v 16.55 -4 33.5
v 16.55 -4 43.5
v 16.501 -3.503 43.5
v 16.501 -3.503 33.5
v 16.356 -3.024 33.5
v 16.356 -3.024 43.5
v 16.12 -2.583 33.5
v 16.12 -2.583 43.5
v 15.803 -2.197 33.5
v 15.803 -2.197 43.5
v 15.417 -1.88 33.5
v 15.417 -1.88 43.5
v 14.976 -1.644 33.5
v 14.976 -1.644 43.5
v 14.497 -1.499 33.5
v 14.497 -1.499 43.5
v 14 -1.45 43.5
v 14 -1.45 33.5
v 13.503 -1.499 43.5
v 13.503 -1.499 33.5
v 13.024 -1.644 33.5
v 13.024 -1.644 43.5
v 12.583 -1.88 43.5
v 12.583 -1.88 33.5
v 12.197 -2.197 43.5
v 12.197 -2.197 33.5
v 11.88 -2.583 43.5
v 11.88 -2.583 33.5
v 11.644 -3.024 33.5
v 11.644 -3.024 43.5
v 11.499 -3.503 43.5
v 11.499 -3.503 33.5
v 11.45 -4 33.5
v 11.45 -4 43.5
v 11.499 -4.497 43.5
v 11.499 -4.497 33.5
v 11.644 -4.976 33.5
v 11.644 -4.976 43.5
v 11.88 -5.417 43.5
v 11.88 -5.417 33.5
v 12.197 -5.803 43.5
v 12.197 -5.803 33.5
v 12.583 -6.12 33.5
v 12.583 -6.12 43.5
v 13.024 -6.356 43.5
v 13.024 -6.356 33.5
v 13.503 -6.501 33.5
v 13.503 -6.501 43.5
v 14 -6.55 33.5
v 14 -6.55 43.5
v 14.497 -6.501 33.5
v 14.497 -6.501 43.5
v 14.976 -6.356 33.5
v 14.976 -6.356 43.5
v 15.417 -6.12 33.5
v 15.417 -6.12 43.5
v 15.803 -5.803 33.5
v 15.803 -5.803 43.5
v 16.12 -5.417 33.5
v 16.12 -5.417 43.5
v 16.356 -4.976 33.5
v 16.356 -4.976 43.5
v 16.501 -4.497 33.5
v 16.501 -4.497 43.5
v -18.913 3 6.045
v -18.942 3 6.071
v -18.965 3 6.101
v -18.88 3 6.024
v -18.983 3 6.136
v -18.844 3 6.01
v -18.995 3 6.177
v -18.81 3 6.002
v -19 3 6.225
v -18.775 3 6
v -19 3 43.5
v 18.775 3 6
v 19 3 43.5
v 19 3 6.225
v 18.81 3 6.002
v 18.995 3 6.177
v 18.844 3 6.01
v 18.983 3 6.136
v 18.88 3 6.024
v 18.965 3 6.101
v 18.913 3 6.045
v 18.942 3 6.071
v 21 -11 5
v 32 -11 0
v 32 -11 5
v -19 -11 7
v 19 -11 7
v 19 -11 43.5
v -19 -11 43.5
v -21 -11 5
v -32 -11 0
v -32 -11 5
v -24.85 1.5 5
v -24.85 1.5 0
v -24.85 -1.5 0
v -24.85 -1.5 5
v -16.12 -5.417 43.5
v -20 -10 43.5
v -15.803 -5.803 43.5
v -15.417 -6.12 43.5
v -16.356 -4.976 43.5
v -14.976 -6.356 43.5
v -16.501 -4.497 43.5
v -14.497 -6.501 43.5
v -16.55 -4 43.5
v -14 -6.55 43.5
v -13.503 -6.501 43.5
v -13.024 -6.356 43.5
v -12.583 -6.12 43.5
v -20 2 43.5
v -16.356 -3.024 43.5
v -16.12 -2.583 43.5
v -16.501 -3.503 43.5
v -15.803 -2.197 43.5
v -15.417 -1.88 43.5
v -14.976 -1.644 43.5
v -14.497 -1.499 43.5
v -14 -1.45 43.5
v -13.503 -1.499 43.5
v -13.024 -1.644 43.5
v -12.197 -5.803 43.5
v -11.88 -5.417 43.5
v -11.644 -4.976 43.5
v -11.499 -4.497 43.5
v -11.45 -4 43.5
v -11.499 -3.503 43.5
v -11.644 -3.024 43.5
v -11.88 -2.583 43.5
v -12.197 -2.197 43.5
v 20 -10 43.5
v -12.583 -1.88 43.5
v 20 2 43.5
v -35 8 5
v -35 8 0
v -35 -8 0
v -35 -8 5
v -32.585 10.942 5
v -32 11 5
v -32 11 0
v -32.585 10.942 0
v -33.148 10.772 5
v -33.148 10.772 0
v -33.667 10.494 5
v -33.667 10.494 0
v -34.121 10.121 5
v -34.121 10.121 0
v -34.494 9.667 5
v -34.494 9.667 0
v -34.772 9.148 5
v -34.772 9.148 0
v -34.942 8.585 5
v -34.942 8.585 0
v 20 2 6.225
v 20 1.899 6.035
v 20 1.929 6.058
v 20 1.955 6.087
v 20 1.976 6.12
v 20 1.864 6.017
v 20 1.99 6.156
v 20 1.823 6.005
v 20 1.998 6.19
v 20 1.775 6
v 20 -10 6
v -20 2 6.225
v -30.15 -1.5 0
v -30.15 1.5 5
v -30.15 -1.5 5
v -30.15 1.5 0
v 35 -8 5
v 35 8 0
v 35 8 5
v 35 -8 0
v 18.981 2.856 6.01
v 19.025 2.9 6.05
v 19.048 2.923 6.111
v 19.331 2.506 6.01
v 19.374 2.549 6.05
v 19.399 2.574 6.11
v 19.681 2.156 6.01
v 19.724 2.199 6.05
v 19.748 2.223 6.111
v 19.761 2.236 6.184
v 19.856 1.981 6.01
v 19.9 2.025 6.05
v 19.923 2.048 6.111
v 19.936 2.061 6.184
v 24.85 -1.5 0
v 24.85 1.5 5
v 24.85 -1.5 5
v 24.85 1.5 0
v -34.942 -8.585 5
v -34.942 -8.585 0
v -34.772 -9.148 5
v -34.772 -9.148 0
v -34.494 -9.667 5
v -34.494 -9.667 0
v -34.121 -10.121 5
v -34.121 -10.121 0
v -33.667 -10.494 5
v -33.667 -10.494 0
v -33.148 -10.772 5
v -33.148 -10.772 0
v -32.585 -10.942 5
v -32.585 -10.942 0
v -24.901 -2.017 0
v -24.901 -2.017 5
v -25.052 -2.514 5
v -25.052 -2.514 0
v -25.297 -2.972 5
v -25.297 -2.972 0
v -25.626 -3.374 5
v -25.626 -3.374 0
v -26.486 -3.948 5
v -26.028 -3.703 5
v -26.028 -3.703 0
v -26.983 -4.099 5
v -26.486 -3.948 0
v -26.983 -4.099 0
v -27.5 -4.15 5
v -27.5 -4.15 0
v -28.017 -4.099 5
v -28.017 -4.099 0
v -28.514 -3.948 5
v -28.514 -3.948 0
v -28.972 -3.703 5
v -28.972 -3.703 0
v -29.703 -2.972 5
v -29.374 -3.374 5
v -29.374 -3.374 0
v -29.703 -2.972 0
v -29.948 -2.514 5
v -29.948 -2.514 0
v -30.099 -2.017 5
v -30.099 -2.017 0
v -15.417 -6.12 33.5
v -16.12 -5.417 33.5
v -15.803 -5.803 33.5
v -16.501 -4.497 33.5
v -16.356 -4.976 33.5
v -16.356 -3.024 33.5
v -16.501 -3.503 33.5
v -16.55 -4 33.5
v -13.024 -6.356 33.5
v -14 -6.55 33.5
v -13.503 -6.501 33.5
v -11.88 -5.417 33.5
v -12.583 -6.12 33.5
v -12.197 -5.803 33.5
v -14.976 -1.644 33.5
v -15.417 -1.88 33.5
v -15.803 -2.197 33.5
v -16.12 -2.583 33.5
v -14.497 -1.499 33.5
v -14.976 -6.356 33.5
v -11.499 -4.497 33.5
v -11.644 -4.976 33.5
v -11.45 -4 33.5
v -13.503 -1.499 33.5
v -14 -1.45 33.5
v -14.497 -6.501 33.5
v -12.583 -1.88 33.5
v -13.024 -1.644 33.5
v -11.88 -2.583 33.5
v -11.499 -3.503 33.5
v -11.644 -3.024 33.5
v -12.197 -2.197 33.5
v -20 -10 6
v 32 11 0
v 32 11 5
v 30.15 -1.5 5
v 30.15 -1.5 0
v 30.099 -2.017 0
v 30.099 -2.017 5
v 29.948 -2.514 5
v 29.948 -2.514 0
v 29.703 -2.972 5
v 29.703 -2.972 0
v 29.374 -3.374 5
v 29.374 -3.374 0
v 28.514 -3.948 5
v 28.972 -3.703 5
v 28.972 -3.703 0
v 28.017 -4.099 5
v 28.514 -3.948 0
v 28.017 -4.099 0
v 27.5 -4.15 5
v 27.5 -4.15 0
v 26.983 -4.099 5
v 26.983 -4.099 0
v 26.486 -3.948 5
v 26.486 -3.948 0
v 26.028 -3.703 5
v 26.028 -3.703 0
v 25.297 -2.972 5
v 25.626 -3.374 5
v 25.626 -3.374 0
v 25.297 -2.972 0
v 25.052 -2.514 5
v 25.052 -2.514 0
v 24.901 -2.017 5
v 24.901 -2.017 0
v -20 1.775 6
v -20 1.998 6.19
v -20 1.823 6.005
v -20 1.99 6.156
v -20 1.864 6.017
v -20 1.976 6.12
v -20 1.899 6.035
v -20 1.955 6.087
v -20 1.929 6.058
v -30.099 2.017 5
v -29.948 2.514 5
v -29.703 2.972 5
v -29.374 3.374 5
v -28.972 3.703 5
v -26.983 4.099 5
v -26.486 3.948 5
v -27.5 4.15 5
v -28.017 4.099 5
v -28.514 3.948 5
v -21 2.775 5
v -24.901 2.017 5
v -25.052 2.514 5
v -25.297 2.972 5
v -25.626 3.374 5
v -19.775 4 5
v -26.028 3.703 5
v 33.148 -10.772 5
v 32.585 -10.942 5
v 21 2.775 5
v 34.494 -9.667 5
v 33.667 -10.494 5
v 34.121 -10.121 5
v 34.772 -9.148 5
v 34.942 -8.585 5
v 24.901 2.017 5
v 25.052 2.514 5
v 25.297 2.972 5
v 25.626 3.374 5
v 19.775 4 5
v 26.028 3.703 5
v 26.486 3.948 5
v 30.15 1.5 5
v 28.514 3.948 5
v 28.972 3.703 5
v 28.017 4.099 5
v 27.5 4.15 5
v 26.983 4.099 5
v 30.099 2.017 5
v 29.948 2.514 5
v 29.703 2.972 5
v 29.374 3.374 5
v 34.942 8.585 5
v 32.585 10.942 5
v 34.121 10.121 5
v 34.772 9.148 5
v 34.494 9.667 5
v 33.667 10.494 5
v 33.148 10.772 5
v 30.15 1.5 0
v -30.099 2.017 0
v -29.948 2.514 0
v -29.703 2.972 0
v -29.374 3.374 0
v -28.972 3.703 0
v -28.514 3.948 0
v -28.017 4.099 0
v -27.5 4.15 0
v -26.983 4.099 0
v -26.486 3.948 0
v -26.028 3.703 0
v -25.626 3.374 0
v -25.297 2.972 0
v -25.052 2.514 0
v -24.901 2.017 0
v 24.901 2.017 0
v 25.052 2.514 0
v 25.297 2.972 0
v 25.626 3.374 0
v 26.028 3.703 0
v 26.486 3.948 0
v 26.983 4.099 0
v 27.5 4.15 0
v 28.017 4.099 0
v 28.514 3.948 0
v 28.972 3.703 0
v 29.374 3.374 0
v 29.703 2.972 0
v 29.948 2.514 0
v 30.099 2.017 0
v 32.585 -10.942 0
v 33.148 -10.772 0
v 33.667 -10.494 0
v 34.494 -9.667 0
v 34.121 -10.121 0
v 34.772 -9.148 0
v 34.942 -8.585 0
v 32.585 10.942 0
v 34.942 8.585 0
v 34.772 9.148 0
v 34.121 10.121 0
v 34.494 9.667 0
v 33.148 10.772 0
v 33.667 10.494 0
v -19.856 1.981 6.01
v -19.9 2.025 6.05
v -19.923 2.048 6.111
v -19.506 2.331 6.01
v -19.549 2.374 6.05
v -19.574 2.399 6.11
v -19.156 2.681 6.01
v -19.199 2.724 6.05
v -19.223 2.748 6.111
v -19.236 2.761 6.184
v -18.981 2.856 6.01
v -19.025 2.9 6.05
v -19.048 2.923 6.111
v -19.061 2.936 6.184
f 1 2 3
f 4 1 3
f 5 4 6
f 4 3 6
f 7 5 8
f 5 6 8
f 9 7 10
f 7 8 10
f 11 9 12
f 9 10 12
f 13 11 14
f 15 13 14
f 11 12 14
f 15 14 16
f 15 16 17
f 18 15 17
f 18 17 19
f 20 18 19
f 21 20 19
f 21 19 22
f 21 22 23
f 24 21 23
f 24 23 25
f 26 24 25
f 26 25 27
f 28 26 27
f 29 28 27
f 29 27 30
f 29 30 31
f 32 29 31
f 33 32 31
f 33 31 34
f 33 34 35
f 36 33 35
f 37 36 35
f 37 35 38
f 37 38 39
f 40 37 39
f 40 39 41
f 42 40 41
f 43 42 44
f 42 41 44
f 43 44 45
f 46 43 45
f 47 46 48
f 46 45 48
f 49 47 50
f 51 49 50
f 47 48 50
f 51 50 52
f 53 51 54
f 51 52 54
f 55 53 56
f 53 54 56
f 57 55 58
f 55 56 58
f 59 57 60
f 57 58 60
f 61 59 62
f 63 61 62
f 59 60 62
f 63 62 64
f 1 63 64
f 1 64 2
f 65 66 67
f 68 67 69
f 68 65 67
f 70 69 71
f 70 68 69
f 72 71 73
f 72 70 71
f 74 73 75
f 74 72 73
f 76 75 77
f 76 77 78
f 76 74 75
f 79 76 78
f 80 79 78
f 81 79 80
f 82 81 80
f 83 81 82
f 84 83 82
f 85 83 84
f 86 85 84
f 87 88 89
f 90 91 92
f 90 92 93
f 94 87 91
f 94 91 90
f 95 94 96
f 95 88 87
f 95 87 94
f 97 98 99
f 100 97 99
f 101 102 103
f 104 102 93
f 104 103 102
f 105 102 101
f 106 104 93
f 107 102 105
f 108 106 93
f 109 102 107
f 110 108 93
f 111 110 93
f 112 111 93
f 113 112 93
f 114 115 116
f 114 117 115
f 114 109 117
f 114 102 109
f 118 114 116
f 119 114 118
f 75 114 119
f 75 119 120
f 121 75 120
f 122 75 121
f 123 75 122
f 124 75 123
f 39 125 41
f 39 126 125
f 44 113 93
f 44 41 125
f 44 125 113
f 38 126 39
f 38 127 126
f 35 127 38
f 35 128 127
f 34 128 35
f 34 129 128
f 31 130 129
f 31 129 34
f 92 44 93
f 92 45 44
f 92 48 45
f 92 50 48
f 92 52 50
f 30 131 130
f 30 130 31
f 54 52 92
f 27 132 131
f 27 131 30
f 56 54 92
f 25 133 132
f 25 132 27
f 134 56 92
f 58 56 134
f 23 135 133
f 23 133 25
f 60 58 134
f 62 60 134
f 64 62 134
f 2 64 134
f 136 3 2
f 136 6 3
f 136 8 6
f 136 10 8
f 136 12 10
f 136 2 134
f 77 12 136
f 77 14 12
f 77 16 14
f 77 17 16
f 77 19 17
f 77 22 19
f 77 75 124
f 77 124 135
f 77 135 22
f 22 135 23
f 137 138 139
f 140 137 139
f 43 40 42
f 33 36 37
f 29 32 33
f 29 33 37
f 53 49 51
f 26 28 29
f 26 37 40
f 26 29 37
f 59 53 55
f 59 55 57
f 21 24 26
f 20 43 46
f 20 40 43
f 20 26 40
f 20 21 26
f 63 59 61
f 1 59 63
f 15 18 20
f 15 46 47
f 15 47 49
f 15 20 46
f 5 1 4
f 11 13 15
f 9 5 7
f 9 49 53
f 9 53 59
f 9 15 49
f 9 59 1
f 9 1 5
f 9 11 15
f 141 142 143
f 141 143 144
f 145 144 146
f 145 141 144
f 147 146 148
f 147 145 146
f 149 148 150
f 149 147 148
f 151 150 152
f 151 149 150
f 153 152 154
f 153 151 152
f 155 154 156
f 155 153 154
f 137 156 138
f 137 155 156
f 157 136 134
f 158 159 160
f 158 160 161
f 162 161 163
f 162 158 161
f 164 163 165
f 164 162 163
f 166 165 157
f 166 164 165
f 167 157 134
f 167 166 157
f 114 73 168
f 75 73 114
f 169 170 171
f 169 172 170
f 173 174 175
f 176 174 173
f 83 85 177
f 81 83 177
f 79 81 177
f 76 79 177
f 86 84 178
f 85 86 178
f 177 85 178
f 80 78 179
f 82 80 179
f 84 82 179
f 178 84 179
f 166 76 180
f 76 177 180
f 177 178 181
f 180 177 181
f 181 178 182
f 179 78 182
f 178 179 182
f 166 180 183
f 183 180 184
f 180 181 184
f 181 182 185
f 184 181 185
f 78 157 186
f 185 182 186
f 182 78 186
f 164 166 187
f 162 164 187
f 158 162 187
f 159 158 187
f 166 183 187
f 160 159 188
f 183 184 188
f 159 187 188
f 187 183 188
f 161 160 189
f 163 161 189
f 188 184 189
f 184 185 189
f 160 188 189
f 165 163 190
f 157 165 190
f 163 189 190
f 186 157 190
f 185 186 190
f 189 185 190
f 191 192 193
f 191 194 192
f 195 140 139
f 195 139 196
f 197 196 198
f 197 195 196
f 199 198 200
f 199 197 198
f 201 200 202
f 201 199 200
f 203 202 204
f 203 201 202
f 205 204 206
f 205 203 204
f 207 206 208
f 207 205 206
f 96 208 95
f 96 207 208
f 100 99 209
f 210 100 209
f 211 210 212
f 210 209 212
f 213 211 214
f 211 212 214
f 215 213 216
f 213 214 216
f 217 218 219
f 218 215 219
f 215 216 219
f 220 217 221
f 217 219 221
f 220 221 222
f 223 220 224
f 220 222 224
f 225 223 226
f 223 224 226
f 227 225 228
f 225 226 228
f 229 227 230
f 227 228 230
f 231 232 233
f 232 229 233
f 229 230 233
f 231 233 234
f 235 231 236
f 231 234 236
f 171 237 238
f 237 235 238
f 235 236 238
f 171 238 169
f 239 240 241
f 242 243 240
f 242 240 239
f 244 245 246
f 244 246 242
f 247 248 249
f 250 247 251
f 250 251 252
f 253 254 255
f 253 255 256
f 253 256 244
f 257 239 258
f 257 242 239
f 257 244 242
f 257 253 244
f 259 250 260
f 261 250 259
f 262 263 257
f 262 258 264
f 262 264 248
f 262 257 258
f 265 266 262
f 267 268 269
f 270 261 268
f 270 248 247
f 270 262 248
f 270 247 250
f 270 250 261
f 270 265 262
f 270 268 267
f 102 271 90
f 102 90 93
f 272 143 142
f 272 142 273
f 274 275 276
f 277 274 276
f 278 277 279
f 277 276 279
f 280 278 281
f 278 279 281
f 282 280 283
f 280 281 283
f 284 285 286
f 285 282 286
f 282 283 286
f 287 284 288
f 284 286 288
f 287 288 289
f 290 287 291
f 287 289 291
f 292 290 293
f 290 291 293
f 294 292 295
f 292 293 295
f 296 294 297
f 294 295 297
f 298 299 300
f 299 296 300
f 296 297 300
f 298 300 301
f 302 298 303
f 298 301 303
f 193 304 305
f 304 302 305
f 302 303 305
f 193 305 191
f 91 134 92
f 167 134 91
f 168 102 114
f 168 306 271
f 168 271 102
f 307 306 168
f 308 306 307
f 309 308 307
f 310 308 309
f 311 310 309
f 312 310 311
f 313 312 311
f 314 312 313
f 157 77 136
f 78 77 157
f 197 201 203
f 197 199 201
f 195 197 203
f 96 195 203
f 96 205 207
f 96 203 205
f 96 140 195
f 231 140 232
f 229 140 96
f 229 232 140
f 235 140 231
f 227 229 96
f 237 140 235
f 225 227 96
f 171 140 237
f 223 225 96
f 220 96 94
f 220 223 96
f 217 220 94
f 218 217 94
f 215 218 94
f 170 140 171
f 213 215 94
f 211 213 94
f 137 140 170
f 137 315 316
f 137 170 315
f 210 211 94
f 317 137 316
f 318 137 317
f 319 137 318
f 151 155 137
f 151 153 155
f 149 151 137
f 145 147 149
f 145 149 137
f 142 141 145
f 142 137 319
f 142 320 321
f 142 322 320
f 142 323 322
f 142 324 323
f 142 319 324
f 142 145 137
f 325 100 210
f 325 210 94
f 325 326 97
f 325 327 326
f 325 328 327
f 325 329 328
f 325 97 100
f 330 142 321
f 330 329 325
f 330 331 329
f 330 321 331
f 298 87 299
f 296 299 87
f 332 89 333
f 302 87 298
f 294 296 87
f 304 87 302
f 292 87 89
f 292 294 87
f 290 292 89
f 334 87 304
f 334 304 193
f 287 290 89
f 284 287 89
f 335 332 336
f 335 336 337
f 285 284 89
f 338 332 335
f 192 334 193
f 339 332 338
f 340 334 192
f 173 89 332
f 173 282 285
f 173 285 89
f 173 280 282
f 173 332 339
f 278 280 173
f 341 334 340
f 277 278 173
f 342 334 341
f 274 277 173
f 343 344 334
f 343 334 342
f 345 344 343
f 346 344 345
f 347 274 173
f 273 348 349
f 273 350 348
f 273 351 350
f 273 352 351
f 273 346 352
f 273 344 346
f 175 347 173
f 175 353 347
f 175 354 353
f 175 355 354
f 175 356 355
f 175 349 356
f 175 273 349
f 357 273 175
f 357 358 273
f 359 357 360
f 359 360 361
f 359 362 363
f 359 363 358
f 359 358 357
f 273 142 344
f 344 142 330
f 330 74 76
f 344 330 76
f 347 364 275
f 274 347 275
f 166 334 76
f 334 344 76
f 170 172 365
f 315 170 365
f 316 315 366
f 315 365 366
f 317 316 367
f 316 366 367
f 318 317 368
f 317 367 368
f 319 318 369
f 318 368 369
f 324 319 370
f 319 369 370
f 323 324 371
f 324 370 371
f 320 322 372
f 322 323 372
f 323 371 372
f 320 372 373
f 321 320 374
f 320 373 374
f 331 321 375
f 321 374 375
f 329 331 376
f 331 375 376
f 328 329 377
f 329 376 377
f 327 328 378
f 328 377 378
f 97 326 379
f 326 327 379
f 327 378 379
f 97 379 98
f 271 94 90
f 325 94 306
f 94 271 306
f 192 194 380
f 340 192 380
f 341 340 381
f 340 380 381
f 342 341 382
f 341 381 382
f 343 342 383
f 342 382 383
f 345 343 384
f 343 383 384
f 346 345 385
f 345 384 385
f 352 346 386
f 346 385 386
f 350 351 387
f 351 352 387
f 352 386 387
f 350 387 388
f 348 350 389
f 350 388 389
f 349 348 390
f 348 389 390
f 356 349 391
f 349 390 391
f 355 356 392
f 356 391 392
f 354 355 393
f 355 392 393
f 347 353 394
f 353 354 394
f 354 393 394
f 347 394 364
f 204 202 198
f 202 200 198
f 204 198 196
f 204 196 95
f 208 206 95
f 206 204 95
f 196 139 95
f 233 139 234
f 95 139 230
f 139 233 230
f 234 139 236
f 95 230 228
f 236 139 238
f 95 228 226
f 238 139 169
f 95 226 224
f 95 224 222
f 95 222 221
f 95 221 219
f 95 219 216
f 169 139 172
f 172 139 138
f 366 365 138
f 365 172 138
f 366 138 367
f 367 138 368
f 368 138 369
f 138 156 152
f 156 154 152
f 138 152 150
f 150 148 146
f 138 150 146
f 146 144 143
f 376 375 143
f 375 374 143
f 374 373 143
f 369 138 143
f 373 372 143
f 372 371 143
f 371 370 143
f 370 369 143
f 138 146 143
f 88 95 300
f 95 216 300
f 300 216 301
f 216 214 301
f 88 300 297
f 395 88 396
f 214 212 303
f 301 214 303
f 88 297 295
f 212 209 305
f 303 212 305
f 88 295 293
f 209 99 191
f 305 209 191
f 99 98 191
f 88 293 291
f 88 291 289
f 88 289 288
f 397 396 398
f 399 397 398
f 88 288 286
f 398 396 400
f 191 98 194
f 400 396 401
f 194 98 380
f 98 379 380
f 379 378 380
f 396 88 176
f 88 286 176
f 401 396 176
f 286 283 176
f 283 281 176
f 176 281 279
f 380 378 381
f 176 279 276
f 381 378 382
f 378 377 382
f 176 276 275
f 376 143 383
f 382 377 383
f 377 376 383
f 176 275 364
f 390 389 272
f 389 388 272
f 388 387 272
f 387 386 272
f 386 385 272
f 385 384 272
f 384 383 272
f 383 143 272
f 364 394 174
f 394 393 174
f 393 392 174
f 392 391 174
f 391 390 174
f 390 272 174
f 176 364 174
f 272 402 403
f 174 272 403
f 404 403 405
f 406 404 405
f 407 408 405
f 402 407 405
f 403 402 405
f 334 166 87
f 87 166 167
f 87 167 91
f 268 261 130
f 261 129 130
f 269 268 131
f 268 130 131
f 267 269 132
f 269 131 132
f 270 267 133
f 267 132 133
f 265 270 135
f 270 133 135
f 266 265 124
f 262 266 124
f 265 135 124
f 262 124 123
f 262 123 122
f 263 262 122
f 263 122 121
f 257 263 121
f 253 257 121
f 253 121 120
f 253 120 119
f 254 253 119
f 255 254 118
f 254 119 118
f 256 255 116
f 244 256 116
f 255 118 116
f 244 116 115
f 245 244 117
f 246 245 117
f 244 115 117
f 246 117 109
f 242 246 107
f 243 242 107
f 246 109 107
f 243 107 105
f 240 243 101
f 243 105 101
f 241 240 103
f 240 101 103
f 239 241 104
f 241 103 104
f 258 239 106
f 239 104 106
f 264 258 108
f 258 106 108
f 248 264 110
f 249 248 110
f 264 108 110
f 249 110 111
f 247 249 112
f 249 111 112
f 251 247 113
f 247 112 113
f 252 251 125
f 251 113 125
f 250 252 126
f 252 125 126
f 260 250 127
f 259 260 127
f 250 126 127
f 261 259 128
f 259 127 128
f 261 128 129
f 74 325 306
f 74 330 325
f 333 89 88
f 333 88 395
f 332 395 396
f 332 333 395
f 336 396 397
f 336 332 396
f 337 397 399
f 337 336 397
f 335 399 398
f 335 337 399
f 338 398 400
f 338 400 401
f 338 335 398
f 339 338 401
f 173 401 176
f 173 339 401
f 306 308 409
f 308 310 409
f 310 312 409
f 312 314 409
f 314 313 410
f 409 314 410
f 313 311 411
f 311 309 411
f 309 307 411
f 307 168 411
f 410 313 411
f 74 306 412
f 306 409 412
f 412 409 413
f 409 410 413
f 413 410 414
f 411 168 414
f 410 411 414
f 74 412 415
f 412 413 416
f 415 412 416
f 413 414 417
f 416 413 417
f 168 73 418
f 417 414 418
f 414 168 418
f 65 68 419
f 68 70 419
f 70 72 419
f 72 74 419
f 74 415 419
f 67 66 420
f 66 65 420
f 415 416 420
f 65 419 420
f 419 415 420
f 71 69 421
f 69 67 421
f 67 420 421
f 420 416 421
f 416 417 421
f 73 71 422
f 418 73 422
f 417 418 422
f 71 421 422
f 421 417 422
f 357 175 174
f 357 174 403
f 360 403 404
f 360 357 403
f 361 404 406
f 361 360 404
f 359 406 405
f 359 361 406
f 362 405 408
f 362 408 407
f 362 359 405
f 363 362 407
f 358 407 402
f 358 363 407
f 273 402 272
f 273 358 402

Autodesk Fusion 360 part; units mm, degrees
sketch "Sketch1" plane through (0, 0, 0) normal (0, 0, 1) x (1, 0, 0)
  line L0 (20, -11) -> (-20, -11)
  line L1 (-20, -11) -> (-20, 11)
  line L2 (-20, 11) -> (20, 11)
  line L3 (20, 11) -> (20, -11)
  line L4 (20, -11) -> (-20, 11) construction
  line L5 (-20, -11) -> (20, 11) construction
  line L6 (20, 11) -> (35, 11)
  line L7 (35, 11) -> (35, -11)
  line L8 (35, -11) -> (20, -11)
  line L9 (20, -11) -> (20, 11)
  line L10 (-20, 11) -> (-35, 11)
  line L11 (-35, 11) -> (-35, -11)
  line L12 (-35, -11) -> (-20, -11)
  line L13 (-20, -11) -> (-20, 11)
  line L14 (-35, 0) -> (35, 0)
  circle A0 centre (27.5, 0) radius 2.65
  circle A1 centre (27.5, 0) radius 5.5 construction
  line L15 (27.5, 11) -> (27.5, -11) construction
  line L16 (-27.5, 11) -> (-27.5, -11) construction
  circle A2 centre (-27.5, 0) radius 2.65
  line L17 (-20, 3) -> (20, 3)
  line L18 (-20, -4) -> (20, -4) construction
  circle A3 centre (14, -4) radius 2.55
  circle A4 centre (-14, -4) radius 2.55
  line L19 (-35, 1.5) -> (35, 1.5) construction
  line L20 (-35, -1.5) -> (35, -1.5) construction
  circle A5 centre (-27.5, 1.5) radius 2.65
  circle A6 centre (-27.5, -1.5) radius 2.65
  circle A7 centre (27.5, -1.5) radius 2.65
  circle A8 centre (27.5, 1.5) radius 2.65
  line L21 (24.85, 1.5) -> (24.85, -1.5)
  line L22 (30.15, 1.5) -> (30.15, -1.5)
  line L23 (-30.15, 1.5) -> (-30.15, -1.5)
  line L24 (-24.85, 1.5) -> (-24.85, -1.5)
  dimension "d1" = 22
  dimension "d2" = 40
  dimension "d3" = 15
  dimension "d4" = 15
  dimension "d5" = 5.3
  dimension "d6" = 11
  dimension "d7" = 5.3
  dimension "d21" = 14
  dimension "d22" = 7
  dimension "d23" = 5.1
  dimension "d24" = 5.1
  dimension "d25" = 6
  dimension "d26" = 6
  dimension "d32" = 1.5
  dimension "d33" = 1.5
  dimension "d34" = 5.3
  dimension "d35" = 5.3
  dimension "d36" = 5.3
  dimension "d37" = 5.3
  dimension "d40" = 28
  dimension "d41" = 55
  dimension "d42" = 13.5
extrude "Extrude2" add sketch "Sketch1" along normal blind 43.5 contours L0 L1 L3 L9 L13 L14 | L1 L3 L9 L13 L14 L17 | A3 | A4
extrude "Extrude1" add sketch "Sketch1" along normal blind 5 contours L3 L7 L8 L9 L14 A7 L21 L22 | L1 L11 L12 L13 L14 A6 L23 L24 | L3 L6 L7 L9 L14 A8 L21 L22 | L1 L10 L11 L13 L14 A5 L23 L24 | L1 L2 L3 L9 L13 L17
extrude "Extrude4" cut sketch "Sketch1" against normal blind 10 from surface at 43.5 contours A3 | A4
fillet "Fillet3" radius 3 4 edges at (-35, -11, 2.5) (-35, 11, 2.5) (35, 11, 2.5) (35, -11, 2.5)
chamfer "Chamfer2" distance 1 angle 45 3 edges at (20, -4, 5) (0, 3, 5) (-20, -4, 5)
chamfer "Chamfer3" distance 1 angle 45 6 edges at (20, -11, 24.75) (20, 3, 24.75) (-20, 3, 24.75) (-20, -11, 24.75) (-20.5, 3.5, 5.5) (20.5, 3.5, 5.5)
chamfer "Chamfer1" [suppressed]
equation "d4 = d3"
equation "d7 = d5"
equation "d22 = ( d21 ) / 2"
equation "d24 = d23"
equation "d26 = d25"
equation "d33 = d32"
equation "d34 = d5"
equation "d35 = d5"
equation "d36 = d5"
equation "d37 = d5"
